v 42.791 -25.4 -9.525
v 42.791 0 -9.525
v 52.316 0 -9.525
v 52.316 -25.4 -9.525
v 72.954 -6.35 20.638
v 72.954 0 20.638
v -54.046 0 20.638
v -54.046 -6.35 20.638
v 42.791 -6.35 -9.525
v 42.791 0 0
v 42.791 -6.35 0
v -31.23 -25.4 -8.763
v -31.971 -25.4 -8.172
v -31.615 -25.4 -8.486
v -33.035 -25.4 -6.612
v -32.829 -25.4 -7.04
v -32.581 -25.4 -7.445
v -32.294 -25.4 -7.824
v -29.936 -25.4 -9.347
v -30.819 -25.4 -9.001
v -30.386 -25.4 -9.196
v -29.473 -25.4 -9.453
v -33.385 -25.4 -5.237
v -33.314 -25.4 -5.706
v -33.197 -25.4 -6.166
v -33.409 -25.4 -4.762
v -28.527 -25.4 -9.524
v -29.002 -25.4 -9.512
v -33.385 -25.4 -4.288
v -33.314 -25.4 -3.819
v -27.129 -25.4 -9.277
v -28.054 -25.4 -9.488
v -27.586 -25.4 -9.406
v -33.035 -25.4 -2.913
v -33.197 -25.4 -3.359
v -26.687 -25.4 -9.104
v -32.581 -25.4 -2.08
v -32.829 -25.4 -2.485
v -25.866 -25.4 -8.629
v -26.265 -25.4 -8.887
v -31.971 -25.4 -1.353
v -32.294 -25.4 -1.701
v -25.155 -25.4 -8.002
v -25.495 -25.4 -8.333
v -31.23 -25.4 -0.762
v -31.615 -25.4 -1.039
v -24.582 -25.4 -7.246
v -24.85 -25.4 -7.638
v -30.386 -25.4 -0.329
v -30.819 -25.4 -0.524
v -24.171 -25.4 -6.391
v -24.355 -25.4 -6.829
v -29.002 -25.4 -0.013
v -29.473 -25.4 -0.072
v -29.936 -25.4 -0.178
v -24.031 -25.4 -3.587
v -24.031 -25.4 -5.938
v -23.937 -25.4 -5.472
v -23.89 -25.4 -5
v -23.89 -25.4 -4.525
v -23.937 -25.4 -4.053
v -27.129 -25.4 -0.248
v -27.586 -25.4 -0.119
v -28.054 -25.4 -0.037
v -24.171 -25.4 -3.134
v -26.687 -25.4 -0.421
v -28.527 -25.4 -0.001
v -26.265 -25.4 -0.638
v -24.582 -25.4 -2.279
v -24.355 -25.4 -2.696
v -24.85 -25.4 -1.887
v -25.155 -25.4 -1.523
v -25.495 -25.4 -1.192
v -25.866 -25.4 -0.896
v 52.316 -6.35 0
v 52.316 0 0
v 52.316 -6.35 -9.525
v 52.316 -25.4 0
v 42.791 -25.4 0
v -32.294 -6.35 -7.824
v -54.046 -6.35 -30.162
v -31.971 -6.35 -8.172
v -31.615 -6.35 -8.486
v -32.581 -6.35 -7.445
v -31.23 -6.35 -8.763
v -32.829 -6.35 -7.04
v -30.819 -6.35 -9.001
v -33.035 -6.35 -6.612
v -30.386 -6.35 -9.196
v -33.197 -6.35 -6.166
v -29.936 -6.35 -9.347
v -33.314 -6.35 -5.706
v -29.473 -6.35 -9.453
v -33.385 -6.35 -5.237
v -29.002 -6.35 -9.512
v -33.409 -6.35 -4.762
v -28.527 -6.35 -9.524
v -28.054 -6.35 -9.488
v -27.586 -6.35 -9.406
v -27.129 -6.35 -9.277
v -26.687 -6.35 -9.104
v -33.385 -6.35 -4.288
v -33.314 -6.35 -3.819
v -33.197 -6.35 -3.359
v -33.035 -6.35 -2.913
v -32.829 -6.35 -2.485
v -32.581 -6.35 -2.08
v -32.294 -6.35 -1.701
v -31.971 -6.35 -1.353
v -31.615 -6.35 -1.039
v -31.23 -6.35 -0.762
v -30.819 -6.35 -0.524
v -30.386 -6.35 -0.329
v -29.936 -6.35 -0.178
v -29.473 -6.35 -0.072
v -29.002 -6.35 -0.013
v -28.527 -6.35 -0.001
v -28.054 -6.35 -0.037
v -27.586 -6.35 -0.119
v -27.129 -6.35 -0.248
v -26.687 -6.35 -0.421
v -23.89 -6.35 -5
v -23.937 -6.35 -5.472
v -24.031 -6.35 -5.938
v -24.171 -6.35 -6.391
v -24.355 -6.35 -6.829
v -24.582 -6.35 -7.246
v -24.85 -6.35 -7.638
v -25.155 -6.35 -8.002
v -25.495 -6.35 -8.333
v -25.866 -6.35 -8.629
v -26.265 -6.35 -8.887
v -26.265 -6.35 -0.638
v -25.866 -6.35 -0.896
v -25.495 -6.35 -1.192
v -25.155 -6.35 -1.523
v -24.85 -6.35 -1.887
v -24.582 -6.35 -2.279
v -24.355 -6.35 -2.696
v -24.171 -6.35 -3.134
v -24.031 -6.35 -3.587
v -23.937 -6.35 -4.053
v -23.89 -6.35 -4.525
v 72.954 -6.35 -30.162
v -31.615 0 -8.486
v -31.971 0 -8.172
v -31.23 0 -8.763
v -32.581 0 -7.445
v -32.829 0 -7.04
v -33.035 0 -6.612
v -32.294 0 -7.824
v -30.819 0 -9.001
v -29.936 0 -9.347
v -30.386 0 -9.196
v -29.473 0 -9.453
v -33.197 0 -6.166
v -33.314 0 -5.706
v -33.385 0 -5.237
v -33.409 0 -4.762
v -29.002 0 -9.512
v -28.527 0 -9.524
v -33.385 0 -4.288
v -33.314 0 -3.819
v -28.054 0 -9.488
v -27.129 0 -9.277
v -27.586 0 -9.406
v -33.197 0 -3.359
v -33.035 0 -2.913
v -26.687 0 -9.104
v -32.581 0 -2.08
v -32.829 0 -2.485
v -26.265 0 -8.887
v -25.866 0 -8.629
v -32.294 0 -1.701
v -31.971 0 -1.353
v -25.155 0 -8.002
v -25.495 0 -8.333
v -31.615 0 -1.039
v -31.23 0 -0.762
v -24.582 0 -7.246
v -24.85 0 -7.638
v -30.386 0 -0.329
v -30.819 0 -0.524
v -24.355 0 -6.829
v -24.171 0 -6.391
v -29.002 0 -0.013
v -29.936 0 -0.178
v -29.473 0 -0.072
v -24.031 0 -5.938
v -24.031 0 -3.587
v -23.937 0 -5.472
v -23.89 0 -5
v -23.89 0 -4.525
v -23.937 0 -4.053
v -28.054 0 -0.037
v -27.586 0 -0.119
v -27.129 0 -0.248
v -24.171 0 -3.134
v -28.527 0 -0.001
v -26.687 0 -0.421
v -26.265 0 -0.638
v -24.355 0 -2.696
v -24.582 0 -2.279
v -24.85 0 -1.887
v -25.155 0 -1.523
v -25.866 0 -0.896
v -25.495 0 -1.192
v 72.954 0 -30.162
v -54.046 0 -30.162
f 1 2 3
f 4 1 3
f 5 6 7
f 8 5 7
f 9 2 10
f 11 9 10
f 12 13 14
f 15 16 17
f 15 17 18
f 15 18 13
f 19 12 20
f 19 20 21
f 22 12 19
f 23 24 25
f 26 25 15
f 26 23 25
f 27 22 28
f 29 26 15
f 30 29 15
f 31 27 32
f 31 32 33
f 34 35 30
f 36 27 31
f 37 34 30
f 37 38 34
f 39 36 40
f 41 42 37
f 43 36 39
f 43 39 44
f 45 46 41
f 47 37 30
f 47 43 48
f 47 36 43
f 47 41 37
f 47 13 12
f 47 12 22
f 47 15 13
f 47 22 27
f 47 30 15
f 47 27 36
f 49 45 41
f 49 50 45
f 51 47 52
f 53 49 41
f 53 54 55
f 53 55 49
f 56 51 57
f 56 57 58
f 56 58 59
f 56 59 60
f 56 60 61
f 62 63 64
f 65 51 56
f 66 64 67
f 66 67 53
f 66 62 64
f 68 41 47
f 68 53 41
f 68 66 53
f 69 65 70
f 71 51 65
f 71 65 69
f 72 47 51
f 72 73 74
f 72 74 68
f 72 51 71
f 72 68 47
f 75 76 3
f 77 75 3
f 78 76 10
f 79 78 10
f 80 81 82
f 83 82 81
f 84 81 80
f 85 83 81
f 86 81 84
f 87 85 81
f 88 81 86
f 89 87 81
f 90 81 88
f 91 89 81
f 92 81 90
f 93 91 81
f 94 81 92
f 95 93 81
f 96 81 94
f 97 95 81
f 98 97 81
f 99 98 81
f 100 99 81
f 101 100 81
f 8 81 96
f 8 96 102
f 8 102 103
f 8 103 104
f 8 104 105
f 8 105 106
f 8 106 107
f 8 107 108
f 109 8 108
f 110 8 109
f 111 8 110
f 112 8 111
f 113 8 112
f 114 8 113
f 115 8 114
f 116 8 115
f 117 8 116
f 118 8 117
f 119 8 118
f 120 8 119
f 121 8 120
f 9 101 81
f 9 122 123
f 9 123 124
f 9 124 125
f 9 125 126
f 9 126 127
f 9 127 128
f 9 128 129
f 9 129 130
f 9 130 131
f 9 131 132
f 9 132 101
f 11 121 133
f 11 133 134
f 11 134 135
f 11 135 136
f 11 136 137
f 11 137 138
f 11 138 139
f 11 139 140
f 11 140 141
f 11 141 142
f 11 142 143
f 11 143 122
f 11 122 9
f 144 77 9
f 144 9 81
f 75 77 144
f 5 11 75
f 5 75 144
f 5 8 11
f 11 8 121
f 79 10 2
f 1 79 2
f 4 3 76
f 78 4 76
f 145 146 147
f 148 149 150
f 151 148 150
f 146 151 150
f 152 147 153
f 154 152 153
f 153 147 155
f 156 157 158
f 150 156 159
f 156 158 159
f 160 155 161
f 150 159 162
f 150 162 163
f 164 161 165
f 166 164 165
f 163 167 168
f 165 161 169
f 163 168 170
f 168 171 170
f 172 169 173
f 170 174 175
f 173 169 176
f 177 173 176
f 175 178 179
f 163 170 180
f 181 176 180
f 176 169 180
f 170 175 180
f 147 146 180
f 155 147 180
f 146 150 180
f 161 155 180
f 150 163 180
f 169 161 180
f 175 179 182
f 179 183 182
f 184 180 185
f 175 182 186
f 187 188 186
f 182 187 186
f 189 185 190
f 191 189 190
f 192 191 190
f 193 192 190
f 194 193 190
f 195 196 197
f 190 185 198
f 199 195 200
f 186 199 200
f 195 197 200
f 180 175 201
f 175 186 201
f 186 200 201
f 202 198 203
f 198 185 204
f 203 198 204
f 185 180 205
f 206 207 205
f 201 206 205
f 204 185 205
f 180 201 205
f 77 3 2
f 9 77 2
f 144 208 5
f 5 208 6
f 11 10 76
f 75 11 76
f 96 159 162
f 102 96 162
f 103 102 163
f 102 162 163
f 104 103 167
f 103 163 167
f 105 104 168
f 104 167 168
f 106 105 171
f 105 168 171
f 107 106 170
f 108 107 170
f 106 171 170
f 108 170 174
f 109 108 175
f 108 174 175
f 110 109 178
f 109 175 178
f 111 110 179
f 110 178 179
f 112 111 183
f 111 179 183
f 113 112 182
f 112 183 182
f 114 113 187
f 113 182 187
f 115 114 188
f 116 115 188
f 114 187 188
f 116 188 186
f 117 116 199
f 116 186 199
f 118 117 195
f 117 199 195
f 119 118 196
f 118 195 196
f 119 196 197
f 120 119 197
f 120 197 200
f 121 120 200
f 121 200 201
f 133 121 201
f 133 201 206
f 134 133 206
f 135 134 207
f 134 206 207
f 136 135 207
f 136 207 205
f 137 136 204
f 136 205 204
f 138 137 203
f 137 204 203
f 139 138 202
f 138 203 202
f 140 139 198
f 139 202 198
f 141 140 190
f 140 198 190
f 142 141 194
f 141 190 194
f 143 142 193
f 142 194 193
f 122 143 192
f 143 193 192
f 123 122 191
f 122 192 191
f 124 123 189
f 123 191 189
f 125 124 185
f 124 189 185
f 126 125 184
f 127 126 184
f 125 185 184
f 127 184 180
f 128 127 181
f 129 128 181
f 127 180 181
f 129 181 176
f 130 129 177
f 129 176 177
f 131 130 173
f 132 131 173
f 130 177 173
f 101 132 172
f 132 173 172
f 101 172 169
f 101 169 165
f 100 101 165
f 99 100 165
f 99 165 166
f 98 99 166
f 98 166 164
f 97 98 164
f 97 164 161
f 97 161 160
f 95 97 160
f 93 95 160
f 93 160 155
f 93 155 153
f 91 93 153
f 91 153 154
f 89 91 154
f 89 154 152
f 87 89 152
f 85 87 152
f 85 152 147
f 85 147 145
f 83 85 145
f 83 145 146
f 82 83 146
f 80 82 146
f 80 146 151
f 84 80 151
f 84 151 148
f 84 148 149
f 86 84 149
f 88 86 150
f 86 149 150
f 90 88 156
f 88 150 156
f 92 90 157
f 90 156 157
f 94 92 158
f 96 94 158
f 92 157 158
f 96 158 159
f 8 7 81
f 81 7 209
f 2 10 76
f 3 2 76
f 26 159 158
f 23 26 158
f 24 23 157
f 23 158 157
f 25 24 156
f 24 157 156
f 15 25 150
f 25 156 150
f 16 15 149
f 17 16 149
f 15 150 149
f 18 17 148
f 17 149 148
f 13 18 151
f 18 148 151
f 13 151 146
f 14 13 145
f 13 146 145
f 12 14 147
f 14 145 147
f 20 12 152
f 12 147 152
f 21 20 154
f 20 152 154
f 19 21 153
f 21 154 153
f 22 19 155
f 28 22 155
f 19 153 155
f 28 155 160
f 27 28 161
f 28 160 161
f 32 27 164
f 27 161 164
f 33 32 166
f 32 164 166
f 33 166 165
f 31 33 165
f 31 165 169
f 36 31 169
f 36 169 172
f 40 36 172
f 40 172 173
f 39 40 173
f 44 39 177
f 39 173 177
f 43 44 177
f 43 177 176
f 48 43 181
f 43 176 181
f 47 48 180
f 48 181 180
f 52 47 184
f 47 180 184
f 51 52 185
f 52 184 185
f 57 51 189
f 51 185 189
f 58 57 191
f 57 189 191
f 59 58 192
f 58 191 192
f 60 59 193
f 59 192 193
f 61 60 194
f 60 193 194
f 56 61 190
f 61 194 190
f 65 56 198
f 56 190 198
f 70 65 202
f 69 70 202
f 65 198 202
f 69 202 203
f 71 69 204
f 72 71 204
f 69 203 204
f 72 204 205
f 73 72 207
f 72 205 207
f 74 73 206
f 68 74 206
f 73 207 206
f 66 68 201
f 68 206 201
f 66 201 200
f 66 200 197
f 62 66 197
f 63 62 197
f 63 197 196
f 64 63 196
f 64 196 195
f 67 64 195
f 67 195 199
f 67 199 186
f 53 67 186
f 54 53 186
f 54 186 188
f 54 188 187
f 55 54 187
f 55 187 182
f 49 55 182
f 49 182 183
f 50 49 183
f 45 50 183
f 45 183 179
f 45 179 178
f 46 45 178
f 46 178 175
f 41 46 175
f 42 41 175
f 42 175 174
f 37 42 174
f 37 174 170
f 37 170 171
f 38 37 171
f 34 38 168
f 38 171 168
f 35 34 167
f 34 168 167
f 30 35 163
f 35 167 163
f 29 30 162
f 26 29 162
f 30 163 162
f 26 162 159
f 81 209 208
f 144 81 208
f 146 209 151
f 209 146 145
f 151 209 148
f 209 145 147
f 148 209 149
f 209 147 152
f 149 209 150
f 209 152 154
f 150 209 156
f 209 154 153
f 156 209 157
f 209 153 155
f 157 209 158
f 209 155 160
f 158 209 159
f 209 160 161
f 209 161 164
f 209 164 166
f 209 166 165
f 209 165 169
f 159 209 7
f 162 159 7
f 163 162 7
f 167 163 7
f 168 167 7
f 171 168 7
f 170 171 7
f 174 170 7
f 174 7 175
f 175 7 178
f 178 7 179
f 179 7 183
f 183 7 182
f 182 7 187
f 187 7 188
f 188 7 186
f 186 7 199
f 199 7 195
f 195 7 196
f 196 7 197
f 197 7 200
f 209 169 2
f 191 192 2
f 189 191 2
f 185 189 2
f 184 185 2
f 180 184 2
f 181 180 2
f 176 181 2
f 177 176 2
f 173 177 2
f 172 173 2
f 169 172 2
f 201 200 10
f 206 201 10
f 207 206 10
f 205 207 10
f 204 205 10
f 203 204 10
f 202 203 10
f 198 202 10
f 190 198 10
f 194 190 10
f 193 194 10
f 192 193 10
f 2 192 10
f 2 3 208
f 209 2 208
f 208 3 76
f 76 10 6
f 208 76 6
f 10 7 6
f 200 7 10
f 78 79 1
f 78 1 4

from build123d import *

# Parameters (mm, degrees)
F1_DEPTH = 25.4
F2_DEPTH = 6.35


with BuildPart() as f1:
    # F0 (on Front) → F1 (new body)
    with BuildSketch(Plane.XZ):
        with BuildLine():
            ThreePointArc((-23.883581, -4.7625), (-28.646081, 0), (-33.408581, -4.7625))
            ThreePointArc((-33.408581, -4.7625), (-28.646081, -9.525), (-23.883581, -4.7625))
        make_face()
        Polygon((52.316419, -9.525), (52.316419, -4.7625), (52.316419, 0), (42.791419, 0), (42.791419, -9.525), align=None)
    extrude(amount=F1_DEPTH)


with BuildPart() as f2:
    # F0 (on Front) → F2 (new body)
    with BuildSketch(Plane.XZ):
        Polygon((72.953919, 20.6375), (-54.046081, 20.6375), (-54.046081, -4.7625), (-54.046081, -30.1625), (72.953919, -30.1625), (72.953919, -4.7625), align=None)
        with BuildLine():
            ThreePointArc((-23.883581, -4.7625), (-28.646081, -9.525), (-33.408581, -4.7625))
            ThreePointArc((-33.408581, -4.7625), (-28.646081, 0), (-23.883581, -4.7625))
        make_face(mode=Mode.SUBTRACT)
        Polygon((52.316419, 0), (52.316419, -4.7625), (52.316419, -9.525), (42.791419, -9.525), (42.791419, 0), align=None, mode=Mode.SUBTRACT)
    extrude(amount=F2_DEPTH)


solid = Compound([f1.part, f2.part])
